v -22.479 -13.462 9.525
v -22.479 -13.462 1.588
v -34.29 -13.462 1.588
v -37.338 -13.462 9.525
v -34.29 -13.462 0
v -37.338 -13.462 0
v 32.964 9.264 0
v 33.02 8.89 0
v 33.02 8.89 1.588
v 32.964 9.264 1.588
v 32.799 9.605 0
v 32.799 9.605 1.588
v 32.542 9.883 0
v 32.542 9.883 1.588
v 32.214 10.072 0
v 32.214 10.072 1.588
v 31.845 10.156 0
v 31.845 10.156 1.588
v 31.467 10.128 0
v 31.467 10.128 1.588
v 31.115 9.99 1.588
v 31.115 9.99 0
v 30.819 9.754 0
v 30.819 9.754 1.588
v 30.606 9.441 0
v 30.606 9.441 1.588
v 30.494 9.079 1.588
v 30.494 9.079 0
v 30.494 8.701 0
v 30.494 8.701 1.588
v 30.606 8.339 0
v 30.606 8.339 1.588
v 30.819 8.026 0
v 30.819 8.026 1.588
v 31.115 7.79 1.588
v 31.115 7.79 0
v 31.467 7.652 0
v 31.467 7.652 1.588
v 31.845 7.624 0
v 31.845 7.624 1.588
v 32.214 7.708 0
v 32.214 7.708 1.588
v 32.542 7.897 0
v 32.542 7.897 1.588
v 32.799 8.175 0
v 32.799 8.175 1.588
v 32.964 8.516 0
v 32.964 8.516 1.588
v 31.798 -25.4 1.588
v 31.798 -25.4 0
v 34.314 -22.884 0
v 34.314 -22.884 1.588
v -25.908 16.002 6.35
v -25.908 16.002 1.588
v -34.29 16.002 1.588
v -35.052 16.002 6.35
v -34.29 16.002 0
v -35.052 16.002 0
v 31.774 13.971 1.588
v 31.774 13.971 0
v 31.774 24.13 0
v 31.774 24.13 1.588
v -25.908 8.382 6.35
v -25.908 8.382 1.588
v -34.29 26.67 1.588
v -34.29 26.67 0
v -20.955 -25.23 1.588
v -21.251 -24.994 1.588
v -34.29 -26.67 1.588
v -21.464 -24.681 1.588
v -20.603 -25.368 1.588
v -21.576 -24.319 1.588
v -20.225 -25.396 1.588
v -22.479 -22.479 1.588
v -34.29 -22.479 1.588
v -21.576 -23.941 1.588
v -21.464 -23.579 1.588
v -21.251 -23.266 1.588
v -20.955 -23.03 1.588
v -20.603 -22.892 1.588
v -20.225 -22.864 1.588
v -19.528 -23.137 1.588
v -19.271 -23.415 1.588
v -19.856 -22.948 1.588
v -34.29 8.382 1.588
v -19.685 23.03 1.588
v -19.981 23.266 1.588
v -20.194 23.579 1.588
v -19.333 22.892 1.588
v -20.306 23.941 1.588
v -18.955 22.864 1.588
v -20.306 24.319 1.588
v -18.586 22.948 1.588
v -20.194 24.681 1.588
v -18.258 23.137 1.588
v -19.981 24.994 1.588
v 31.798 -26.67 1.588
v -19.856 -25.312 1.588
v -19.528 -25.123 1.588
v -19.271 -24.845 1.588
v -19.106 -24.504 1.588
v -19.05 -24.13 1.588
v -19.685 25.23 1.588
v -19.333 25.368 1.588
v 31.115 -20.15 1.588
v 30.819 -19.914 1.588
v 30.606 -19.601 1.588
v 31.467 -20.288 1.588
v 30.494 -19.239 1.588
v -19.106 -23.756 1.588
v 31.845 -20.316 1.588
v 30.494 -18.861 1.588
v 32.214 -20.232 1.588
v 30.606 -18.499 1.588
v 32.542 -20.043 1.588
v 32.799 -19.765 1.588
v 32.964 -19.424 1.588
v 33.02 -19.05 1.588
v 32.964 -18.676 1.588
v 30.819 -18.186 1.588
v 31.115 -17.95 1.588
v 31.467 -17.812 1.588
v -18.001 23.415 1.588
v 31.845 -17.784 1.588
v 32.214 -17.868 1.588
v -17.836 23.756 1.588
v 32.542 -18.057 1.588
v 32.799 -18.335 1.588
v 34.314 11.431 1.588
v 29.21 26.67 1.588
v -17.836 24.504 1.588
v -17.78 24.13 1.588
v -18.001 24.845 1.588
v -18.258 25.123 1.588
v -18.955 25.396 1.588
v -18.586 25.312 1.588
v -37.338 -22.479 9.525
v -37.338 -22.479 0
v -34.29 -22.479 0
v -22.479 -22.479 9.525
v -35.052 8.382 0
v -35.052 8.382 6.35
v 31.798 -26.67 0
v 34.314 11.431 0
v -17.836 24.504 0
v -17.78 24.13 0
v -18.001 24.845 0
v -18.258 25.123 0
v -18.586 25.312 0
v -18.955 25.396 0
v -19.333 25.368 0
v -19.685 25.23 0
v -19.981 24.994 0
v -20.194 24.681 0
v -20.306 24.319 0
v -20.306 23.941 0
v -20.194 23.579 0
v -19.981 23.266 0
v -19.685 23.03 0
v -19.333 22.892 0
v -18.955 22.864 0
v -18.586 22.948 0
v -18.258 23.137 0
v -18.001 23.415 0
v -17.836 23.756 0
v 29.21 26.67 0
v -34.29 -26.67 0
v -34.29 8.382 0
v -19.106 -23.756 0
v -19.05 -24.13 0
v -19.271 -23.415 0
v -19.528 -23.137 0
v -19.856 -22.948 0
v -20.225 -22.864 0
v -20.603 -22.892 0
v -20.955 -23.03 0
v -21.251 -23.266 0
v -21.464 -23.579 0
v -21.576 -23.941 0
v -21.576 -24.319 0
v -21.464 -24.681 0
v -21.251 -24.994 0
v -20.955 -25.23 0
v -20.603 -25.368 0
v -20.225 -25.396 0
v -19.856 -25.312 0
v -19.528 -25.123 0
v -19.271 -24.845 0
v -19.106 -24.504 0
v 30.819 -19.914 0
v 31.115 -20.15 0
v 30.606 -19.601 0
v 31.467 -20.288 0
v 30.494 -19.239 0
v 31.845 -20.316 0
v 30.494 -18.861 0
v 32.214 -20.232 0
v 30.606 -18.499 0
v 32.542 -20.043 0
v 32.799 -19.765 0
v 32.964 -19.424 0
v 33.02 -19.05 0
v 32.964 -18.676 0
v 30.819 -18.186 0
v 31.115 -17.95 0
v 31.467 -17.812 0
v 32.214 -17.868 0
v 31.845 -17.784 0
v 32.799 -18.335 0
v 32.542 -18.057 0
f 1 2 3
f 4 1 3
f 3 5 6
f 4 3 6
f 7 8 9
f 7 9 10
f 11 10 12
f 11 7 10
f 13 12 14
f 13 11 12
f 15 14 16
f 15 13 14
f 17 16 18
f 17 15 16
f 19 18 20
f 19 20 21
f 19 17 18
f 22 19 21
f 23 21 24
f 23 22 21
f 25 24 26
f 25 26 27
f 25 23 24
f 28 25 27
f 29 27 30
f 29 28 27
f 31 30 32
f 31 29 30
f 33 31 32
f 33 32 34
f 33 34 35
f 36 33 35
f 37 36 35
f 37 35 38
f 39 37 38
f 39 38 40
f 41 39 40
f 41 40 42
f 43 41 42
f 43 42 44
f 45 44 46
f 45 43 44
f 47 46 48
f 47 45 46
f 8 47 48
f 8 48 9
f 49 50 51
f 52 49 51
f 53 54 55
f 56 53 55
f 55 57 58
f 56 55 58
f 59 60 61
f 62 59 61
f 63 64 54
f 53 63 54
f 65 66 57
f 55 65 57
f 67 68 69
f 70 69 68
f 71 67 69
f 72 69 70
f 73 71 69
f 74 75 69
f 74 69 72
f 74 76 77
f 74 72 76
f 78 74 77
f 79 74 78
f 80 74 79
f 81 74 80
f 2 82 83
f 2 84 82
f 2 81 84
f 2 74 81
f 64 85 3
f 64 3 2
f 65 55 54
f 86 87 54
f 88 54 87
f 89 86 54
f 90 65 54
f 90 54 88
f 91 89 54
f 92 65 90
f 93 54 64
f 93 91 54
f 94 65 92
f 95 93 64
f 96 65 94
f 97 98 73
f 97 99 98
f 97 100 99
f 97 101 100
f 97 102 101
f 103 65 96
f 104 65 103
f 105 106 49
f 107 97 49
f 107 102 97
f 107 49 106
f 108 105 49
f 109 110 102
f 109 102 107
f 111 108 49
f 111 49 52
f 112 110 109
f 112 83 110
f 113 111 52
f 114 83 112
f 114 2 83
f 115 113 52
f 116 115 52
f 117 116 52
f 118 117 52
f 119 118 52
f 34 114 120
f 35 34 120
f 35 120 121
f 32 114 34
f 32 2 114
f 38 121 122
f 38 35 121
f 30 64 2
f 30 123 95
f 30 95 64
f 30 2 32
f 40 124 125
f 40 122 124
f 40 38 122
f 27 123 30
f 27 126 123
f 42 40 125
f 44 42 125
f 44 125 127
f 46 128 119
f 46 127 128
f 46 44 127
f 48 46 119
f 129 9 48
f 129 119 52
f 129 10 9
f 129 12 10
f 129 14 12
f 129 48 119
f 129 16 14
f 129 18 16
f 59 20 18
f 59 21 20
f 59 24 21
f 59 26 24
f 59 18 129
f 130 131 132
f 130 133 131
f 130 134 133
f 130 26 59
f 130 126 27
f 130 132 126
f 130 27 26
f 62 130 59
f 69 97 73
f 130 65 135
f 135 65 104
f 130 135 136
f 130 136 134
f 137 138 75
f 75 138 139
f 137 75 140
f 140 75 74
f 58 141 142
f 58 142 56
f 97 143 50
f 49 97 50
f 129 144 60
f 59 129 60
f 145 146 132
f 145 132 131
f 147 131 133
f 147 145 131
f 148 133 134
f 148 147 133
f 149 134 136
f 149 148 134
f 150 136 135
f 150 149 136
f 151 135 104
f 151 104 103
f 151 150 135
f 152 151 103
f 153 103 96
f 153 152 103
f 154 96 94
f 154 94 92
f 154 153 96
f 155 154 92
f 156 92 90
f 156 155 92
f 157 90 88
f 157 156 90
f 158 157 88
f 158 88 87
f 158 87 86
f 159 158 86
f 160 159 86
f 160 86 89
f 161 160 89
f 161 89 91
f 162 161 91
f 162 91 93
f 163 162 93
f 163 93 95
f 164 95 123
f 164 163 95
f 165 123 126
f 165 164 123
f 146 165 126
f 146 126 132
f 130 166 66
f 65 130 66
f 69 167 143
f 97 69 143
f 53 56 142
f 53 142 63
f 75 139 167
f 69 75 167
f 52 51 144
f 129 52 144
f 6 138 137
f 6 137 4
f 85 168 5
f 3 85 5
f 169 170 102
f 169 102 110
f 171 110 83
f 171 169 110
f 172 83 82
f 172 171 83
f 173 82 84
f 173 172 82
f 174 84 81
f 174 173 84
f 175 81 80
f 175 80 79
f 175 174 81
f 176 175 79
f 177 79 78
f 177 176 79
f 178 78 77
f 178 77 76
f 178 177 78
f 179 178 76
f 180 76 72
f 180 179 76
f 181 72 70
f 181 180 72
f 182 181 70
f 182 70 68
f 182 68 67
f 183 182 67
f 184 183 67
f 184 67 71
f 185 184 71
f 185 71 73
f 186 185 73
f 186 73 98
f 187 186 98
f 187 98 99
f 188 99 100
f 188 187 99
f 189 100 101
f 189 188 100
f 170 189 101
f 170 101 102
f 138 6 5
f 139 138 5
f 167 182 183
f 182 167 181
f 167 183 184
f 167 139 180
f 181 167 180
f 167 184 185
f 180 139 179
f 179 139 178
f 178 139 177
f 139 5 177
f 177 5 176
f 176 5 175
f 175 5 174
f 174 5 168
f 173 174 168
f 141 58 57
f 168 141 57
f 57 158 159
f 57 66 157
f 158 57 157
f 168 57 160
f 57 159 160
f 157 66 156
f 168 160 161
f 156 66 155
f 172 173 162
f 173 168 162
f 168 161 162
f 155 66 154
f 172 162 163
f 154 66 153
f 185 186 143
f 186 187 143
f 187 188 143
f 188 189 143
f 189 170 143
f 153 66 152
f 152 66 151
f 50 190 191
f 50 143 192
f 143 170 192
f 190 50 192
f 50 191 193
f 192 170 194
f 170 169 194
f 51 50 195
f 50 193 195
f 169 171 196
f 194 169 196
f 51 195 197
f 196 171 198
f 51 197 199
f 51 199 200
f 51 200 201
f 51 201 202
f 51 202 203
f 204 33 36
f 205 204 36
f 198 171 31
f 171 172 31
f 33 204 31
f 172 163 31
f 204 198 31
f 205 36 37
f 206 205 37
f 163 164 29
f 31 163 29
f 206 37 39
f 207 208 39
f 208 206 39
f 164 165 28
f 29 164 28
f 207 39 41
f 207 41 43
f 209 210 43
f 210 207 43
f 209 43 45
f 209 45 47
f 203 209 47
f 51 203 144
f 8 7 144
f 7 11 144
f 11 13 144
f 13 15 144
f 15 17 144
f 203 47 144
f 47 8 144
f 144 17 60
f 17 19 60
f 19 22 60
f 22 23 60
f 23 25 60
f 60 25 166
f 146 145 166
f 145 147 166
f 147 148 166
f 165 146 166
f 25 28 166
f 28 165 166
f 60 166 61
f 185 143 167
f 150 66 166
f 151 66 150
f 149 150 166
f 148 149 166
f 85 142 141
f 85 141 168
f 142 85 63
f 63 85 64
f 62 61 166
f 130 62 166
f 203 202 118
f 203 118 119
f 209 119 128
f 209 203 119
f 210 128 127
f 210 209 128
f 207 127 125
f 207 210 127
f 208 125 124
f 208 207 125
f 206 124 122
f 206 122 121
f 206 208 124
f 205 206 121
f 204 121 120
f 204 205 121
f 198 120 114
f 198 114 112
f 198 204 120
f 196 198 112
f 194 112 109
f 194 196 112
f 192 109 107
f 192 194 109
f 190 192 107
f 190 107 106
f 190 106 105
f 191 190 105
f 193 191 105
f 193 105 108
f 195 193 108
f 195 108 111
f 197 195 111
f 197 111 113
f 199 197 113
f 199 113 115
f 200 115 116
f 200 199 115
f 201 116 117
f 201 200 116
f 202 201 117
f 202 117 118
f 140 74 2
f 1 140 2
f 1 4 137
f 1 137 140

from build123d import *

# Parameters (mm, degrees)
F0_R     = 1.27
F1_DEPTH = 1.5875
F0_W     = 8.382
F0_H     = 7.62
F0_W_2   = 0.762
F2_DEPTH = 6.35
F0_W_3   = 11.811
F0_H_2   = 9.017
F0_W_4   = 3.048
F3_DEPTH = 9.525


with BuildPart() as f1:
    # F0 (on Top) → F1 (new body)
    with BuildSketch(Plane.XY):
        Polygon((-34.29, -26.67), (31.79811, -26.67), (31.79811, -25.4), (34.314021, -22.884089), (34.314021, 11.430663), (31.774021, 13.970663), (31.774021, 24.13), (29.21, 26.67), (-34.29, 26.67), (-34.29, 16.002), (-25.908, 16.002), (-25.908, 8.382), (-34.29, 8.382), (-34.29, -13.462), (-22.479, -13.462), (-22.479, -22.479), (-34.29, -22.479), align=None)
        with Locations((-20.32, -24.13)):
            Circle(F0_R, mode=Mode.SUBTRACT)
        with Locations((31.75, -19.05)):
            Circle(F0_R, mode=Mode.SUBTRACT)
        with Locations((-19.05, 24.13)):
            Circle(F0_R, mode=Mode.SUBTRACT)
        with Locations((31.75, 8.89)):
            Circle(F0_R, mode=Mode.SUBTRACT)
    extrude(amount=F1_DEPTH)

    # F0 (on Top) → F2 (join)
    with BuildSketch(Plane.XY):
        with Locations((-30.099, 12.192)):
            Rectangle(F0_W, F0_H)
        with Locations((-34.671, 12.192)):
            Rectangle(F0_W_2, F0_H)
    extrude(amount=F2_DEPTH)

    # F0 (on Top) → F3 (join)
    with BuildSketch(Plane.XY):
        with Locations((-28.3845, -17.9705)):
            Rectangle(F0_W_3, F0_H_2)
        with Locations((-35.814, -17.9705)):
            Rectangle(F0_W_4, F0_H_2)
    extrude(amount=F3_DEPTH)


solid = f1.part
